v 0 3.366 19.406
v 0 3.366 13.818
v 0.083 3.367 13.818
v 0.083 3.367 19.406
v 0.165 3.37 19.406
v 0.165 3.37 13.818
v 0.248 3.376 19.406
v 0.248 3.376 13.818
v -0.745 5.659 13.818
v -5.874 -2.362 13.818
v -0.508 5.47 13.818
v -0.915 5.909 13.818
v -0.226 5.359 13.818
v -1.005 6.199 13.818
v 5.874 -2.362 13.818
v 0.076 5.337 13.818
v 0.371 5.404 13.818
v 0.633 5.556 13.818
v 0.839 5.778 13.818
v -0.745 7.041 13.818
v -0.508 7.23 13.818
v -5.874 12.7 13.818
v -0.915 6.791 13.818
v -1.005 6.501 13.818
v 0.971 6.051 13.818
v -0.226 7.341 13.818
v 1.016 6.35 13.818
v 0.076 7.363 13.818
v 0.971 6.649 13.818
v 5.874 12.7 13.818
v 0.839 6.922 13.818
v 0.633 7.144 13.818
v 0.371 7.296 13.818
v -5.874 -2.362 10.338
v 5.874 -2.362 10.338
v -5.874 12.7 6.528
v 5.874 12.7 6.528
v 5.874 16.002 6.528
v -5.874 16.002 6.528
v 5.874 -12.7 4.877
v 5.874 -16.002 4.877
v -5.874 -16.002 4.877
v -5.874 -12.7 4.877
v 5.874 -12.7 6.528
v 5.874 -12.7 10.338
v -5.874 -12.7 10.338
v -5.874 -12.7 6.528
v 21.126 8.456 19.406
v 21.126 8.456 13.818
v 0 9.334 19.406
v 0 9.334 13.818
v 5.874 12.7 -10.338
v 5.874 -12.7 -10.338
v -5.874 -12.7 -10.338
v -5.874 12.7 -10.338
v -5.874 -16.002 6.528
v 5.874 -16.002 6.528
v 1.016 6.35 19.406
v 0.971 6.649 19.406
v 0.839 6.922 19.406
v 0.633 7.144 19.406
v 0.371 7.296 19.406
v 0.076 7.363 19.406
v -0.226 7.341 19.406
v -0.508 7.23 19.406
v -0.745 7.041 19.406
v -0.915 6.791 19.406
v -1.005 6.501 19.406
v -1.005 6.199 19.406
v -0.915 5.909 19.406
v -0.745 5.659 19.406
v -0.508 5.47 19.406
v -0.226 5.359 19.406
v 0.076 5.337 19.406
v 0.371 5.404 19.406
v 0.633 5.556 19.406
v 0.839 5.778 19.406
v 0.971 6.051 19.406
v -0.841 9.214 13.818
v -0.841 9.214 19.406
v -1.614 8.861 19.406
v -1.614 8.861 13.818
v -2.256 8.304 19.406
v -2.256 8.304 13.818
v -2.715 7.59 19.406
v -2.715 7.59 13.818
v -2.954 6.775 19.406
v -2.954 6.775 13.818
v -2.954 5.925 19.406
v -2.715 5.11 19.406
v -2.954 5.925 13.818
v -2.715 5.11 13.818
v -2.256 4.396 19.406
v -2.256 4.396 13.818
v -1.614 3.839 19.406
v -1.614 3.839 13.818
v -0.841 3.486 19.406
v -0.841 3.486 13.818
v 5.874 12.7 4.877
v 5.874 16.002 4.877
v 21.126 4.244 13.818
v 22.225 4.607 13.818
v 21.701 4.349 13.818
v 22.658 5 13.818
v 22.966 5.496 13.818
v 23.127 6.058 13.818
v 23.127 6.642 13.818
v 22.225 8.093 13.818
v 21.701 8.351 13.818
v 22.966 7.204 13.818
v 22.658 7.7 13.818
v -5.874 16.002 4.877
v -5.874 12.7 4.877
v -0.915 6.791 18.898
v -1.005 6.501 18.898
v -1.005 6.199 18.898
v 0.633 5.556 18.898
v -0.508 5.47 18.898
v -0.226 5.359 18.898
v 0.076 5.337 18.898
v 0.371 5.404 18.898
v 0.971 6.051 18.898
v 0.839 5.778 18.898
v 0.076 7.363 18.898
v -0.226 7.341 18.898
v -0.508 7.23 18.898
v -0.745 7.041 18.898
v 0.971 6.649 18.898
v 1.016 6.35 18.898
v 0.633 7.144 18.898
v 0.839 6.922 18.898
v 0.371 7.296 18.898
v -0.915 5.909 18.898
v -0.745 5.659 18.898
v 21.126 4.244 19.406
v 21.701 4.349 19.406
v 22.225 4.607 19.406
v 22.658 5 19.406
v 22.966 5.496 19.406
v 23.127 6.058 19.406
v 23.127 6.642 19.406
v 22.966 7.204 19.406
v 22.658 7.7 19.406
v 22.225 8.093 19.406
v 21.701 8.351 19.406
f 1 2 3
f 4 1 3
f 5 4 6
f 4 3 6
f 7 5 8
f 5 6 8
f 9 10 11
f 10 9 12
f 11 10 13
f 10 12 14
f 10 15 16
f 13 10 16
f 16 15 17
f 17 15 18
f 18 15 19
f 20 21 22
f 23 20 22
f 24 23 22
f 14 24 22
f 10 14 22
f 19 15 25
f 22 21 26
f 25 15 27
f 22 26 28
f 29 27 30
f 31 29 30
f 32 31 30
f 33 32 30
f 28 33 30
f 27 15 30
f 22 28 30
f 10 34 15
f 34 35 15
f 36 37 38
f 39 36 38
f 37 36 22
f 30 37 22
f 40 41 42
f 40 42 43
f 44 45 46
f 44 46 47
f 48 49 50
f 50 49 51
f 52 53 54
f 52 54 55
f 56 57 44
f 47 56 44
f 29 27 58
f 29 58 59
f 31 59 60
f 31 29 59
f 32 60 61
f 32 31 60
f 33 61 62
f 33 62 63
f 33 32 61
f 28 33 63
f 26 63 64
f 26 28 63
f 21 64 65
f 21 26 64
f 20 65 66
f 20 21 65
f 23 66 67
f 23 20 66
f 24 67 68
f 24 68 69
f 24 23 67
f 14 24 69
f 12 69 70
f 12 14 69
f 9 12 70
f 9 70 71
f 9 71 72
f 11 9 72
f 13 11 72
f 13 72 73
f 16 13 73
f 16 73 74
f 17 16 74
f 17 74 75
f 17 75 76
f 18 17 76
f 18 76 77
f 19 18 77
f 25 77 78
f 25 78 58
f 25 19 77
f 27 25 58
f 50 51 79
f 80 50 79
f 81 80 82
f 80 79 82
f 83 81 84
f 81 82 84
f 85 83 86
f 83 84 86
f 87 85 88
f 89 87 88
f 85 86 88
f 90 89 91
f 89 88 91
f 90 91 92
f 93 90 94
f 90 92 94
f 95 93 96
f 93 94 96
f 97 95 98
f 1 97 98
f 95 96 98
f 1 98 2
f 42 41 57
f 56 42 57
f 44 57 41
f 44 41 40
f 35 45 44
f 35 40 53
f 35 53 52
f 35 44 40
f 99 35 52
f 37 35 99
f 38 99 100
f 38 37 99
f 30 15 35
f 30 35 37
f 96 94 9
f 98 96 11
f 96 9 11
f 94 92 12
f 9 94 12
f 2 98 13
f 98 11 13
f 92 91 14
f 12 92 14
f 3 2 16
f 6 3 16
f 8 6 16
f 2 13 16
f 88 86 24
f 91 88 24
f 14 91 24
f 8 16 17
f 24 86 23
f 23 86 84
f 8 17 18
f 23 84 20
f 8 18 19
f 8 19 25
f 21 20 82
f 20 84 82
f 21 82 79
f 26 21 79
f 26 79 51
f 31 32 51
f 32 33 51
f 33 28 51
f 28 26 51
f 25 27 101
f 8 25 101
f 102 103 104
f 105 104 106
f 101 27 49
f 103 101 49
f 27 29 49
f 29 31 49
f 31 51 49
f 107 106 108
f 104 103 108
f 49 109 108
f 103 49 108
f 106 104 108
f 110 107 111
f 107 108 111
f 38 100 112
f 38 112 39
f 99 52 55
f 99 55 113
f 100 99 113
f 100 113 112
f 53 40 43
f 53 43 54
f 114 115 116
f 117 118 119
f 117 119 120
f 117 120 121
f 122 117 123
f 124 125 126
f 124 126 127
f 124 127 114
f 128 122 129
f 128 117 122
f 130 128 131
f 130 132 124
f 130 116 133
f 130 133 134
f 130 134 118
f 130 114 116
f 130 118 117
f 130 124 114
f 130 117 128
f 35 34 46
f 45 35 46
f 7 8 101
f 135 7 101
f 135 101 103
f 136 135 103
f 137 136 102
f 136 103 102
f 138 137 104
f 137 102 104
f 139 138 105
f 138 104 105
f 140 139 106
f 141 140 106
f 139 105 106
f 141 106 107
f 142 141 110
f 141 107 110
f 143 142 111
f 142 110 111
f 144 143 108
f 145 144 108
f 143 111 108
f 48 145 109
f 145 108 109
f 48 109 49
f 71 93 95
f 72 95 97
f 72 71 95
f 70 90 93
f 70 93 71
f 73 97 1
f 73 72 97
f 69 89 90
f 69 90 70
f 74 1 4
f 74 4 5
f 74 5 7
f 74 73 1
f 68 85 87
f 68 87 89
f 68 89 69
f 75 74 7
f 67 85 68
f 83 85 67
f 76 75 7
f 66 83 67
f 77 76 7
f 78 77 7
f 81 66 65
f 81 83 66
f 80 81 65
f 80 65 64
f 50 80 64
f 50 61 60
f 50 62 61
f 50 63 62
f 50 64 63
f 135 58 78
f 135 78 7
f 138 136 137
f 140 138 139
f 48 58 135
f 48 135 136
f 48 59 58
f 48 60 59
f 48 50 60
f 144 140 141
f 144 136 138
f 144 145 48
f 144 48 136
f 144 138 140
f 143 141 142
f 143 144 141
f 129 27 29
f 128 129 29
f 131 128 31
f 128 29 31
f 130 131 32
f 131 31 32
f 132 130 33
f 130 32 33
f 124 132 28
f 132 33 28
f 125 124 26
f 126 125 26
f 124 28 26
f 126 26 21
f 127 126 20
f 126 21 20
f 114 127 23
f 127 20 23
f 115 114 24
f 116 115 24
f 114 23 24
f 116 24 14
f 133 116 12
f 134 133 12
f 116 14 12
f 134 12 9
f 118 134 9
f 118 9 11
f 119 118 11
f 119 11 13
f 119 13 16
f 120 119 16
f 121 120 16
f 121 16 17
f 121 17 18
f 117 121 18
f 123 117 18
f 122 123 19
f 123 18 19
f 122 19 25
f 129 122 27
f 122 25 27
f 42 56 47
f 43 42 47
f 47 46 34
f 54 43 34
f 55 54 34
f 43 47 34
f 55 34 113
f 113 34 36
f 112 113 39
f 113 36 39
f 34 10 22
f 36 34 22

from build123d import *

# Parameters (mm, degrees)
F0_W     = 3.302
F0_H     = 1.651
F0_W_2   = 15.0622
F0_H_2   = 3.4798
F1_DEPTH = 5.87375
F2_R     = 1.016
F3_DEPTH = 5.588
F4_DEPTH = 5.08


with BuildPart() as f1:
    # F0 (on Right) → F1 (new body, symmetric)
    with BuildSketch(Plane.YZ):
        Polygon((12.7, 6.5278), (12.7, 10.3378), (-2.3622, 10.3378), (-12.7, 10.3378), (-12.7, 6.5278), (-12.7, 4.8768), (-12.7, -10.3378), (12.7, -10.3378), (12.7, 4.8768), align=None)
        with Locations((-14.351, 5.7023)):
            Rectangle(F0_W, F0_H)
        with Locations((5.1689, 12.0777)):
            Rectangle(F0_W_2, F0_H_2)
        with Locations((14.351, 5.7023)):
            Rectangle(F0_W, F0_H)
    extrude(amount=F1_DEPTH, both=True)

    # F2 (on face) → F4 (join)
    with BuildSketch(Plane.XY.offset(13.8176)):
        with Locations((0, 6.35)):
            Circle(F2_R)
    extrude(amount=F4_DEPTH)


with BuildPart() as f3:
    # F2 (on face) → F3 (new body)
    with BuildSketch(Plane.XY.offset(13.8176)):
        with BuildLine():
            Line((21.1262666217, 8.4563812185), (0, 9.3345))
            ThreePointArc((0, 9.3345), (-2.9845, 6.35), (0, 3.3655))
            Line((0, 3.3655), (0.2476751405, 3.3757946818))
            Line((0.2476751405, 3.3757946818), (21.1262666217, 4.2436187815))
            ThreePointArc((21.1262666217, 4.2436187815), (23.146914337, 6.35), (21.1262666217, 8.4563812185))
        make_face()
        with Locations((0, 6.35)):
            Circle(F2_R, mode=Mode.SUBTRACT)
        with BuildLine():
            Line((0.2476751405, 3.3757946818), (0, 3.3655))
            ThreePointArc((0, 3.3655), (0.1239444994, 3.3680747811), (0.2476751405, 3.3757946818))
        make_face()
    extrude(amount=F3_DEPTH)


solid = Compound([f1.part, f3.part])
